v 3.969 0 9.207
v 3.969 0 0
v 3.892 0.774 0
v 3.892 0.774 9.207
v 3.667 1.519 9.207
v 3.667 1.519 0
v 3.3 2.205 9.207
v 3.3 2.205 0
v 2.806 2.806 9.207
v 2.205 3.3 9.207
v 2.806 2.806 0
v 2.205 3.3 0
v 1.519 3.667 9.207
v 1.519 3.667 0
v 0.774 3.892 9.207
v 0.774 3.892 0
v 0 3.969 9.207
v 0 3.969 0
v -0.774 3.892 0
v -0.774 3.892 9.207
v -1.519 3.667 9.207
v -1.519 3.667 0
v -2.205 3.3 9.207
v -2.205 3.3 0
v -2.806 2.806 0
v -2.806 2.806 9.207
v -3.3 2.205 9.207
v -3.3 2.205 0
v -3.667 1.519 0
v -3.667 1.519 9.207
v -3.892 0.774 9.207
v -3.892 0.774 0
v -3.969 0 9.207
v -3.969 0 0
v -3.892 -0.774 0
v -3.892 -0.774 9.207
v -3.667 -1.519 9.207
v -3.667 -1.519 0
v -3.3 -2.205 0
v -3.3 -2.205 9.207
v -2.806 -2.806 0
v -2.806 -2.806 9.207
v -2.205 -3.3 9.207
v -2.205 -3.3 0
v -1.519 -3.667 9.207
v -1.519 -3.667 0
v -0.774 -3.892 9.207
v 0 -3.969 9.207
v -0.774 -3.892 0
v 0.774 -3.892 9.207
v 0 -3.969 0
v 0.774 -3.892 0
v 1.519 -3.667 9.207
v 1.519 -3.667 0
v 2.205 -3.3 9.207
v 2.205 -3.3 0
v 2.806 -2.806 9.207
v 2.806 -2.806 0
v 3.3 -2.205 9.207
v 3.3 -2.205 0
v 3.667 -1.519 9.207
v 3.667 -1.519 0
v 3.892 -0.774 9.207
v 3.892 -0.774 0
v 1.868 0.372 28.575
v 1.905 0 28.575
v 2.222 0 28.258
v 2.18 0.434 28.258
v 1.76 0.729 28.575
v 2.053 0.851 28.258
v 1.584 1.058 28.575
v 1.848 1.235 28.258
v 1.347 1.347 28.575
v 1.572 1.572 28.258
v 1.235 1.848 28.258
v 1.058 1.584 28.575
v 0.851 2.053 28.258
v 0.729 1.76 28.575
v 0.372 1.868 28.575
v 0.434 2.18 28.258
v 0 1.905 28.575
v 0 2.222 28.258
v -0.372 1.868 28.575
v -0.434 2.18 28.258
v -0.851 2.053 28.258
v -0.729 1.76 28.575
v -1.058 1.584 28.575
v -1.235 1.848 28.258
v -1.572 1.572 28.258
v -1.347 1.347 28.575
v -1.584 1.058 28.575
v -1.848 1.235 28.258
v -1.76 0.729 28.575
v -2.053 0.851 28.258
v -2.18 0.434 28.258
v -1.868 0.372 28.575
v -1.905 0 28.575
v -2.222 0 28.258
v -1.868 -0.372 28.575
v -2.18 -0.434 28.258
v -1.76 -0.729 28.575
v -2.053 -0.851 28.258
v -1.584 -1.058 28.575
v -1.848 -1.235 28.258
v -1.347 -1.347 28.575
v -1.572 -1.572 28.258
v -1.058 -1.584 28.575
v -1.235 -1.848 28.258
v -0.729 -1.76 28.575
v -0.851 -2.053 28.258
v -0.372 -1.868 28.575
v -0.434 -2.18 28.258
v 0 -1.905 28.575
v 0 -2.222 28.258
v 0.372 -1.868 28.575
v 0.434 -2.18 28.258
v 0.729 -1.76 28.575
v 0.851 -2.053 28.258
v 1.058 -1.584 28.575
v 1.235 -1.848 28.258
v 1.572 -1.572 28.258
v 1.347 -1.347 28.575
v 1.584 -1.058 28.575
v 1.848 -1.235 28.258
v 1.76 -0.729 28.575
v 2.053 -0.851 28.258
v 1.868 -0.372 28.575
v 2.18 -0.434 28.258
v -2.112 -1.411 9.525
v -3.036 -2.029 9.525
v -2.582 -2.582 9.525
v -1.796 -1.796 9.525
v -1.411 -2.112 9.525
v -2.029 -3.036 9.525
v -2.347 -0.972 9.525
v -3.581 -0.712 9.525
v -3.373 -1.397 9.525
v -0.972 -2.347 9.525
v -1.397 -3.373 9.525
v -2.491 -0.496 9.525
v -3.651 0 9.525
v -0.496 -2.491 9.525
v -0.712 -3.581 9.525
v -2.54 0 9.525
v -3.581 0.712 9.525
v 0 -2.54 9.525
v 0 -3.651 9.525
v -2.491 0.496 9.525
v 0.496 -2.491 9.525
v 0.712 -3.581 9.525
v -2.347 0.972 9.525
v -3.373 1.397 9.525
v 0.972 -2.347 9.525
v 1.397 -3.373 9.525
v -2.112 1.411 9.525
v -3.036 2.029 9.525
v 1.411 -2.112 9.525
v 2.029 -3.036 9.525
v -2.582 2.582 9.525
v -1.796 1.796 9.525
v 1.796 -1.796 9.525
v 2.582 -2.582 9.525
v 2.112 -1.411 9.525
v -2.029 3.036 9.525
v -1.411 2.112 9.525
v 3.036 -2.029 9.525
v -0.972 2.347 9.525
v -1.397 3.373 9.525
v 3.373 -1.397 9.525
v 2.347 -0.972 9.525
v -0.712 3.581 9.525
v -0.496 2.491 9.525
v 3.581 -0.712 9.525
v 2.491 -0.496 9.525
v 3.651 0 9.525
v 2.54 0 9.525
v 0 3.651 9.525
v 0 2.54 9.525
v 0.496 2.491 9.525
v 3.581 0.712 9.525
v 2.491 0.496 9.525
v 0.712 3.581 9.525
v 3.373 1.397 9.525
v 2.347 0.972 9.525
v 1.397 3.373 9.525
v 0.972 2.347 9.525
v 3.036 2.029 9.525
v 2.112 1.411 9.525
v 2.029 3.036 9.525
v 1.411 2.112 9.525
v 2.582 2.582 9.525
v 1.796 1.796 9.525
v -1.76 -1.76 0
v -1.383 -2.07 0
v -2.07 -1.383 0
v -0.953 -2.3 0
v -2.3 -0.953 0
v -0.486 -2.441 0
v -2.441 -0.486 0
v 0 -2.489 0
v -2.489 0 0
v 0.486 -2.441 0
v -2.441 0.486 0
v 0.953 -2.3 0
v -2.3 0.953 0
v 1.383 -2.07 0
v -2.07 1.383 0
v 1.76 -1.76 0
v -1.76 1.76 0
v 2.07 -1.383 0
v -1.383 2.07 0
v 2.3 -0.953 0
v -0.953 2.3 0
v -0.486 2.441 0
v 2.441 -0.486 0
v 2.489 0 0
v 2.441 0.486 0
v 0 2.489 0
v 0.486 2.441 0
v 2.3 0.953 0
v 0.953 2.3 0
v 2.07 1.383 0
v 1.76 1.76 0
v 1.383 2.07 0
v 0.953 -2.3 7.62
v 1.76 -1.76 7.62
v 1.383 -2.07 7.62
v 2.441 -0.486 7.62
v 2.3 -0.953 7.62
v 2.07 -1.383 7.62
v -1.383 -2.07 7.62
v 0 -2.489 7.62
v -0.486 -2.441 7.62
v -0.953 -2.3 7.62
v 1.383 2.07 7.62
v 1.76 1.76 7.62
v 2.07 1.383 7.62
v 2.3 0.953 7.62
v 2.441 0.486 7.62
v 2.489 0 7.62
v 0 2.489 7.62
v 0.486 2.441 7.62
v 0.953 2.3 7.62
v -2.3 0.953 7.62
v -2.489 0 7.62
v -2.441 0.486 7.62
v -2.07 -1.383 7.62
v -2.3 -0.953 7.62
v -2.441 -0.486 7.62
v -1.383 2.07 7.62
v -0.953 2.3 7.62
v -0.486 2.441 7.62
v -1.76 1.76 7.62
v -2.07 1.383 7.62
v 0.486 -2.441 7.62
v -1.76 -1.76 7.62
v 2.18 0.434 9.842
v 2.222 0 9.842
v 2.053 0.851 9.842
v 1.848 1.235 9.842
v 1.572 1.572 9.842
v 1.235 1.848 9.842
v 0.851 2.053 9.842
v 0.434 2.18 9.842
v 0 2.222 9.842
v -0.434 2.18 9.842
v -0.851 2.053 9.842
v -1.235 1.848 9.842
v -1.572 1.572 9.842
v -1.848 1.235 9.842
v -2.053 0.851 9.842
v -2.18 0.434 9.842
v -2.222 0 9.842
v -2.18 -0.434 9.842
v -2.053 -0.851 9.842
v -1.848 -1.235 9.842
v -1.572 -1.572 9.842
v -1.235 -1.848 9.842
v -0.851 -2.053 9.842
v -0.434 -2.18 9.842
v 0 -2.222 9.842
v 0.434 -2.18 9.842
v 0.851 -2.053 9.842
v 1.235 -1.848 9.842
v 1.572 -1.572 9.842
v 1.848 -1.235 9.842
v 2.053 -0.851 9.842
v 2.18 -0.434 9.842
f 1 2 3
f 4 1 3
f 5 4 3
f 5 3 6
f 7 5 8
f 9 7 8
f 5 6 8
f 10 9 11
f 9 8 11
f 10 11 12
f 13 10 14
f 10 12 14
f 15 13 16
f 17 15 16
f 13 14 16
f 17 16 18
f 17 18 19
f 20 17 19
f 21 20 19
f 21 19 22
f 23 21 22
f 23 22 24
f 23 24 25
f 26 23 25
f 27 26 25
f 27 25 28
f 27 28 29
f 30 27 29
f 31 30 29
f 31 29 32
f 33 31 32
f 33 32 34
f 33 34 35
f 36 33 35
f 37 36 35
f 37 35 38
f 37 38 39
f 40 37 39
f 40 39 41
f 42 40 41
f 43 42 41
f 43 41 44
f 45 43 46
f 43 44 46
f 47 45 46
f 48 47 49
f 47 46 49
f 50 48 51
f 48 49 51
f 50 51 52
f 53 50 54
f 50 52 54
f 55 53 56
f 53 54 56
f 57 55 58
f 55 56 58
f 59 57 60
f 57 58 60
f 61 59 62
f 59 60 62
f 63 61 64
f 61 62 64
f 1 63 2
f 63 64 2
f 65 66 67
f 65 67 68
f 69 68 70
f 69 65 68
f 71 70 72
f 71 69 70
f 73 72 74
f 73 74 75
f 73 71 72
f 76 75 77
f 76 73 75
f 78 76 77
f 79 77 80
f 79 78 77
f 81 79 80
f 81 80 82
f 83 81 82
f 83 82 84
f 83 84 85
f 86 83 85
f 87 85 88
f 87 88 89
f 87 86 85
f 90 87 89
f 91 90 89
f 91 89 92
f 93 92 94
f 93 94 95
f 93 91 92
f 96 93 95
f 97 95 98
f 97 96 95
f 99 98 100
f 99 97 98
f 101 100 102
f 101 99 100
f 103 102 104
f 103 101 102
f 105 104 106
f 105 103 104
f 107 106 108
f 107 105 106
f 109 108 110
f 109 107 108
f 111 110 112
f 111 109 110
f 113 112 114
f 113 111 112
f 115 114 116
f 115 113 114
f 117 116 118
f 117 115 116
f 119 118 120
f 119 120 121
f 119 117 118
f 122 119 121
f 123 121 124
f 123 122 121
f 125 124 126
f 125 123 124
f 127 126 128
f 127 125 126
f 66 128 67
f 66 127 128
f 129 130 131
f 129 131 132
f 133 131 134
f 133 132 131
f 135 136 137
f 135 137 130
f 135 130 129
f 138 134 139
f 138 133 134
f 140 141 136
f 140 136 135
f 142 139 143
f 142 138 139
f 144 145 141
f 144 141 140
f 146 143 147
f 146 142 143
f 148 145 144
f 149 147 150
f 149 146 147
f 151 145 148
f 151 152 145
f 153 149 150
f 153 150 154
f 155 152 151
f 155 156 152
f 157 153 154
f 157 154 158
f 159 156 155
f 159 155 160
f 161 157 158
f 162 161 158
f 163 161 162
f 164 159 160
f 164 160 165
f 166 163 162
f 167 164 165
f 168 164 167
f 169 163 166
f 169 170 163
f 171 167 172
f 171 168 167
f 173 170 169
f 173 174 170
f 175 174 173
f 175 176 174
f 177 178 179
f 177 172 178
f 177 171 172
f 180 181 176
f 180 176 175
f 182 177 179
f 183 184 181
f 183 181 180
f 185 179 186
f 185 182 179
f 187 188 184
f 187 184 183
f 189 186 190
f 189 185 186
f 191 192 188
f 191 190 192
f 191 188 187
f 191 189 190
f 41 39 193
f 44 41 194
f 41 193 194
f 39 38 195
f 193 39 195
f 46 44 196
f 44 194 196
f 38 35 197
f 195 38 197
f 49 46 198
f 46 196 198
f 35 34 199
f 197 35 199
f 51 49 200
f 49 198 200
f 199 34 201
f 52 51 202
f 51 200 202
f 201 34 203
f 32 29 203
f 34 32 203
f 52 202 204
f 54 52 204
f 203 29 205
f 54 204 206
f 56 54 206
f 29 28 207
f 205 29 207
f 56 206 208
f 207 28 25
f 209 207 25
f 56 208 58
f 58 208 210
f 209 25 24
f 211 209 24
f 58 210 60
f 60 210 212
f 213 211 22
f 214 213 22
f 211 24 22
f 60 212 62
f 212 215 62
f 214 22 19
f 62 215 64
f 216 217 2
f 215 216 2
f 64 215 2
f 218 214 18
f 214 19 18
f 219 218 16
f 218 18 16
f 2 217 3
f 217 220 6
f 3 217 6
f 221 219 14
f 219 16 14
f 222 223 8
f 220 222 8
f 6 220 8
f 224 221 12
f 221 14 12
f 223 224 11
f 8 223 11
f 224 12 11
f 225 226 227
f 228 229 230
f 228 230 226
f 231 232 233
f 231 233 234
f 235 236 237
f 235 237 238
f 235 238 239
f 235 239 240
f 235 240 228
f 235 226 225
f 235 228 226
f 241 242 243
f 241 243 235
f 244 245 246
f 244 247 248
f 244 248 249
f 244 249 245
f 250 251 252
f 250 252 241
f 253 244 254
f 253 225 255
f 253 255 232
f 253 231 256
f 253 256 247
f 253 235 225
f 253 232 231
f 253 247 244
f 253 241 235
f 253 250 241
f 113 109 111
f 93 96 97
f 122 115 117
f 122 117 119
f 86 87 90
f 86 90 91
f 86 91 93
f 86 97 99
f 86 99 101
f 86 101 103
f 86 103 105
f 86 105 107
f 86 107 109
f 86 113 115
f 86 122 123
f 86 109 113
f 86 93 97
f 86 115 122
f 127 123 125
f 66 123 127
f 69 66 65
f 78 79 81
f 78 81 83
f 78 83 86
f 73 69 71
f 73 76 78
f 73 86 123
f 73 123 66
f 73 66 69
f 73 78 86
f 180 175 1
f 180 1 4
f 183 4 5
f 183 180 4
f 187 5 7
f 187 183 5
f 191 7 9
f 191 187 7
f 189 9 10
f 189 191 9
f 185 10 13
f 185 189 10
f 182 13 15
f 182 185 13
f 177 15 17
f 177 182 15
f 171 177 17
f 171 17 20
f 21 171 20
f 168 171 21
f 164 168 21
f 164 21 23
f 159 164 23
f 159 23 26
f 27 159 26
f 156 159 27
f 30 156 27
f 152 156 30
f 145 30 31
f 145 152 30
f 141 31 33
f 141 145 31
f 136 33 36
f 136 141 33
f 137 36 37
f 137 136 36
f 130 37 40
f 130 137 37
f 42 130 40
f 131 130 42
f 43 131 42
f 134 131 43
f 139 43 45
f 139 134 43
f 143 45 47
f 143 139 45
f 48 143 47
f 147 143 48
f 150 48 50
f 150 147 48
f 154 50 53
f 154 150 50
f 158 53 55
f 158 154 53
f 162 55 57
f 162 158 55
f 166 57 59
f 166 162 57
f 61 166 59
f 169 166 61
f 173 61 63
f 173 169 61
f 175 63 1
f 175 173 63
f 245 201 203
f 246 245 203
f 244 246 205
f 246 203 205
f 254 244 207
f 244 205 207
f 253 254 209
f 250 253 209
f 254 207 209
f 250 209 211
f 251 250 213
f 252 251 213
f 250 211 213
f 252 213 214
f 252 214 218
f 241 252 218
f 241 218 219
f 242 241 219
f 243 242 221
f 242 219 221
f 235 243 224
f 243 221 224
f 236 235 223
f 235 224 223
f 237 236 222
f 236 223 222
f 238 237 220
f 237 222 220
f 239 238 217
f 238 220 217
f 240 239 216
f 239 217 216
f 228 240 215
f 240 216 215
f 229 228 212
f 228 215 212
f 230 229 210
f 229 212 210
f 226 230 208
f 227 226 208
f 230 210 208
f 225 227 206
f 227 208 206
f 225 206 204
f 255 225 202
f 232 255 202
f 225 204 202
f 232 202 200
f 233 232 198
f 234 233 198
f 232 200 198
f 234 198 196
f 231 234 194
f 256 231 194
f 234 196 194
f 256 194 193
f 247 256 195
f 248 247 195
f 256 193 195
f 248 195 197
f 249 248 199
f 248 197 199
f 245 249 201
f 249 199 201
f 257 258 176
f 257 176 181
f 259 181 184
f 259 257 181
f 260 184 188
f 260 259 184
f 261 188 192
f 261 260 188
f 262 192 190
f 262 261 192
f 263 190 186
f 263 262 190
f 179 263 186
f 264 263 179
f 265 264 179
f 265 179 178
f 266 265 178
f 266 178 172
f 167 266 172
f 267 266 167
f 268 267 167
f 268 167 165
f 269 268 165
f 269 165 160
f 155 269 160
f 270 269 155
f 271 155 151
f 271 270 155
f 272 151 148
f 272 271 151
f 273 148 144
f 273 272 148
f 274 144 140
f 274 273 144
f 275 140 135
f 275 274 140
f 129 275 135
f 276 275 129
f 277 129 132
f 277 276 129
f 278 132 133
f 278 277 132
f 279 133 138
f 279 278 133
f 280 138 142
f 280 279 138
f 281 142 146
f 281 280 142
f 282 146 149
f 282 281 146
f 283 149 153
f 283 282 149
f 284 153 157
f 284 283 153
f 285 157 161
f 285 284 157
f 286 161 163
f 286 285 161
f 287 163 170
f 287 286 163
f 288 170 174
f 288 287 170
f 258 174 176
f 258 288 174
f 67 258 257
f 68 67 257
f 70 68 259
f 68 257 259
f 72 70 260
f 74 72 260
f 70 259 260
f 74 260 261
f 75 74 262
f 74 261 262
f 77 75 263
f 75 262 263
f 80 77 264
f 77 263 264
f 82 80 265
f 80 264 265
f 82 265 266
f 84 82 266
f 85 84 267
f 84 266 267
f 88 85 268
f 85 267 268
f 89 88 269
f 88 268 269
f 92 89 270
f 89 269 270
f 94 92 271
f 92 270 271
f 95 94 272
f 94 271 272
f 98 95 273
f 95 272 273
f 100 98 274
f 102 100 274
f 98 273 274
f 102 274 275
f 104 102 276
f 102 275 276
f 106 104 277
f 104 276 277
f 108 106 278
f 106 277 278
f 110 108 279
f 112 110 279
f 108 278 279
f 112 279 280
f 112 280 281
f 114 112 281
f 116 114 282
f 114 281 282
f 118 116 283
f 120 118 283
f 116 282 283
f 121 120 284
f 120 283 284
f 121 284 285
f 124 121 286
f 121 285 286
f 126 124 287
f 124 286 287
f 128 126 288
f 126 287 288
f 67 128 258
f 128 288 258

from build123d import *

# Parameters (mm, degrees)
SKETCH1_R           = 3.96875
BOSS_EXTRUDE1_DEPTH = 28.575
CUT_EXTRUDE1_START  = -19.05
SKETCH2_R           = 3.96875
SKETCH2_R_2         = 2.2225
CUT_EXTRUDE1_DEPTH  = 19.05
SKETCH3_R           = 2.4892
CUT_EXTRUDE2_DEPTH  = 7.62
CHAMFER1_SIZE       = 0.3175


with BuildPart() as part:
    # Sketch1 → Boss-Extrude1 (new body)
    with BuildSketch(Plane.XY):
        Circle(SKETCH1_R)
    extrude(amount=BOSS_EXTRUDE1_DEPTH)

    # Sketch2 → Cut-Extrude1 (cut)
    with BuildSketch(Plane.XY.offset(28.575).offset(CUT_EXTRUDE1_START)):
        Circle(SKETCH2_R)
        Circle(SKETCH2_R_2, mode=Mode.SUBTRACT)
    extrude(amount=CUT_EXTRUDE1_DEPTH, mode=Mode.SUBTRACT)

    # Sketch3 → Cut-Extrude2 (cut)
    with BuildSketch(Plane(origin=(0, 0, 0), x_dir=(-1, 0, 0), z_dir=(0, 0, -1))):
        Circle(SKETCH3_R)
    extrude(amount=-CUT_EXTRUDE2_DEPTH, mode=Mode.SUBTRACT)

    # Chamfer1
    chamfer1_edges = [part.edges().sort_by_distance(p)[0] for p in [
        (-2.2225, 0, 28.575),
        (-3.96875, 0, 9.525),
        (-2.2225, 0, 9.525),
    ]]
    chamfer(chamfer1_edges, length=CHAMFER1_SIZE)


solid = part.part
